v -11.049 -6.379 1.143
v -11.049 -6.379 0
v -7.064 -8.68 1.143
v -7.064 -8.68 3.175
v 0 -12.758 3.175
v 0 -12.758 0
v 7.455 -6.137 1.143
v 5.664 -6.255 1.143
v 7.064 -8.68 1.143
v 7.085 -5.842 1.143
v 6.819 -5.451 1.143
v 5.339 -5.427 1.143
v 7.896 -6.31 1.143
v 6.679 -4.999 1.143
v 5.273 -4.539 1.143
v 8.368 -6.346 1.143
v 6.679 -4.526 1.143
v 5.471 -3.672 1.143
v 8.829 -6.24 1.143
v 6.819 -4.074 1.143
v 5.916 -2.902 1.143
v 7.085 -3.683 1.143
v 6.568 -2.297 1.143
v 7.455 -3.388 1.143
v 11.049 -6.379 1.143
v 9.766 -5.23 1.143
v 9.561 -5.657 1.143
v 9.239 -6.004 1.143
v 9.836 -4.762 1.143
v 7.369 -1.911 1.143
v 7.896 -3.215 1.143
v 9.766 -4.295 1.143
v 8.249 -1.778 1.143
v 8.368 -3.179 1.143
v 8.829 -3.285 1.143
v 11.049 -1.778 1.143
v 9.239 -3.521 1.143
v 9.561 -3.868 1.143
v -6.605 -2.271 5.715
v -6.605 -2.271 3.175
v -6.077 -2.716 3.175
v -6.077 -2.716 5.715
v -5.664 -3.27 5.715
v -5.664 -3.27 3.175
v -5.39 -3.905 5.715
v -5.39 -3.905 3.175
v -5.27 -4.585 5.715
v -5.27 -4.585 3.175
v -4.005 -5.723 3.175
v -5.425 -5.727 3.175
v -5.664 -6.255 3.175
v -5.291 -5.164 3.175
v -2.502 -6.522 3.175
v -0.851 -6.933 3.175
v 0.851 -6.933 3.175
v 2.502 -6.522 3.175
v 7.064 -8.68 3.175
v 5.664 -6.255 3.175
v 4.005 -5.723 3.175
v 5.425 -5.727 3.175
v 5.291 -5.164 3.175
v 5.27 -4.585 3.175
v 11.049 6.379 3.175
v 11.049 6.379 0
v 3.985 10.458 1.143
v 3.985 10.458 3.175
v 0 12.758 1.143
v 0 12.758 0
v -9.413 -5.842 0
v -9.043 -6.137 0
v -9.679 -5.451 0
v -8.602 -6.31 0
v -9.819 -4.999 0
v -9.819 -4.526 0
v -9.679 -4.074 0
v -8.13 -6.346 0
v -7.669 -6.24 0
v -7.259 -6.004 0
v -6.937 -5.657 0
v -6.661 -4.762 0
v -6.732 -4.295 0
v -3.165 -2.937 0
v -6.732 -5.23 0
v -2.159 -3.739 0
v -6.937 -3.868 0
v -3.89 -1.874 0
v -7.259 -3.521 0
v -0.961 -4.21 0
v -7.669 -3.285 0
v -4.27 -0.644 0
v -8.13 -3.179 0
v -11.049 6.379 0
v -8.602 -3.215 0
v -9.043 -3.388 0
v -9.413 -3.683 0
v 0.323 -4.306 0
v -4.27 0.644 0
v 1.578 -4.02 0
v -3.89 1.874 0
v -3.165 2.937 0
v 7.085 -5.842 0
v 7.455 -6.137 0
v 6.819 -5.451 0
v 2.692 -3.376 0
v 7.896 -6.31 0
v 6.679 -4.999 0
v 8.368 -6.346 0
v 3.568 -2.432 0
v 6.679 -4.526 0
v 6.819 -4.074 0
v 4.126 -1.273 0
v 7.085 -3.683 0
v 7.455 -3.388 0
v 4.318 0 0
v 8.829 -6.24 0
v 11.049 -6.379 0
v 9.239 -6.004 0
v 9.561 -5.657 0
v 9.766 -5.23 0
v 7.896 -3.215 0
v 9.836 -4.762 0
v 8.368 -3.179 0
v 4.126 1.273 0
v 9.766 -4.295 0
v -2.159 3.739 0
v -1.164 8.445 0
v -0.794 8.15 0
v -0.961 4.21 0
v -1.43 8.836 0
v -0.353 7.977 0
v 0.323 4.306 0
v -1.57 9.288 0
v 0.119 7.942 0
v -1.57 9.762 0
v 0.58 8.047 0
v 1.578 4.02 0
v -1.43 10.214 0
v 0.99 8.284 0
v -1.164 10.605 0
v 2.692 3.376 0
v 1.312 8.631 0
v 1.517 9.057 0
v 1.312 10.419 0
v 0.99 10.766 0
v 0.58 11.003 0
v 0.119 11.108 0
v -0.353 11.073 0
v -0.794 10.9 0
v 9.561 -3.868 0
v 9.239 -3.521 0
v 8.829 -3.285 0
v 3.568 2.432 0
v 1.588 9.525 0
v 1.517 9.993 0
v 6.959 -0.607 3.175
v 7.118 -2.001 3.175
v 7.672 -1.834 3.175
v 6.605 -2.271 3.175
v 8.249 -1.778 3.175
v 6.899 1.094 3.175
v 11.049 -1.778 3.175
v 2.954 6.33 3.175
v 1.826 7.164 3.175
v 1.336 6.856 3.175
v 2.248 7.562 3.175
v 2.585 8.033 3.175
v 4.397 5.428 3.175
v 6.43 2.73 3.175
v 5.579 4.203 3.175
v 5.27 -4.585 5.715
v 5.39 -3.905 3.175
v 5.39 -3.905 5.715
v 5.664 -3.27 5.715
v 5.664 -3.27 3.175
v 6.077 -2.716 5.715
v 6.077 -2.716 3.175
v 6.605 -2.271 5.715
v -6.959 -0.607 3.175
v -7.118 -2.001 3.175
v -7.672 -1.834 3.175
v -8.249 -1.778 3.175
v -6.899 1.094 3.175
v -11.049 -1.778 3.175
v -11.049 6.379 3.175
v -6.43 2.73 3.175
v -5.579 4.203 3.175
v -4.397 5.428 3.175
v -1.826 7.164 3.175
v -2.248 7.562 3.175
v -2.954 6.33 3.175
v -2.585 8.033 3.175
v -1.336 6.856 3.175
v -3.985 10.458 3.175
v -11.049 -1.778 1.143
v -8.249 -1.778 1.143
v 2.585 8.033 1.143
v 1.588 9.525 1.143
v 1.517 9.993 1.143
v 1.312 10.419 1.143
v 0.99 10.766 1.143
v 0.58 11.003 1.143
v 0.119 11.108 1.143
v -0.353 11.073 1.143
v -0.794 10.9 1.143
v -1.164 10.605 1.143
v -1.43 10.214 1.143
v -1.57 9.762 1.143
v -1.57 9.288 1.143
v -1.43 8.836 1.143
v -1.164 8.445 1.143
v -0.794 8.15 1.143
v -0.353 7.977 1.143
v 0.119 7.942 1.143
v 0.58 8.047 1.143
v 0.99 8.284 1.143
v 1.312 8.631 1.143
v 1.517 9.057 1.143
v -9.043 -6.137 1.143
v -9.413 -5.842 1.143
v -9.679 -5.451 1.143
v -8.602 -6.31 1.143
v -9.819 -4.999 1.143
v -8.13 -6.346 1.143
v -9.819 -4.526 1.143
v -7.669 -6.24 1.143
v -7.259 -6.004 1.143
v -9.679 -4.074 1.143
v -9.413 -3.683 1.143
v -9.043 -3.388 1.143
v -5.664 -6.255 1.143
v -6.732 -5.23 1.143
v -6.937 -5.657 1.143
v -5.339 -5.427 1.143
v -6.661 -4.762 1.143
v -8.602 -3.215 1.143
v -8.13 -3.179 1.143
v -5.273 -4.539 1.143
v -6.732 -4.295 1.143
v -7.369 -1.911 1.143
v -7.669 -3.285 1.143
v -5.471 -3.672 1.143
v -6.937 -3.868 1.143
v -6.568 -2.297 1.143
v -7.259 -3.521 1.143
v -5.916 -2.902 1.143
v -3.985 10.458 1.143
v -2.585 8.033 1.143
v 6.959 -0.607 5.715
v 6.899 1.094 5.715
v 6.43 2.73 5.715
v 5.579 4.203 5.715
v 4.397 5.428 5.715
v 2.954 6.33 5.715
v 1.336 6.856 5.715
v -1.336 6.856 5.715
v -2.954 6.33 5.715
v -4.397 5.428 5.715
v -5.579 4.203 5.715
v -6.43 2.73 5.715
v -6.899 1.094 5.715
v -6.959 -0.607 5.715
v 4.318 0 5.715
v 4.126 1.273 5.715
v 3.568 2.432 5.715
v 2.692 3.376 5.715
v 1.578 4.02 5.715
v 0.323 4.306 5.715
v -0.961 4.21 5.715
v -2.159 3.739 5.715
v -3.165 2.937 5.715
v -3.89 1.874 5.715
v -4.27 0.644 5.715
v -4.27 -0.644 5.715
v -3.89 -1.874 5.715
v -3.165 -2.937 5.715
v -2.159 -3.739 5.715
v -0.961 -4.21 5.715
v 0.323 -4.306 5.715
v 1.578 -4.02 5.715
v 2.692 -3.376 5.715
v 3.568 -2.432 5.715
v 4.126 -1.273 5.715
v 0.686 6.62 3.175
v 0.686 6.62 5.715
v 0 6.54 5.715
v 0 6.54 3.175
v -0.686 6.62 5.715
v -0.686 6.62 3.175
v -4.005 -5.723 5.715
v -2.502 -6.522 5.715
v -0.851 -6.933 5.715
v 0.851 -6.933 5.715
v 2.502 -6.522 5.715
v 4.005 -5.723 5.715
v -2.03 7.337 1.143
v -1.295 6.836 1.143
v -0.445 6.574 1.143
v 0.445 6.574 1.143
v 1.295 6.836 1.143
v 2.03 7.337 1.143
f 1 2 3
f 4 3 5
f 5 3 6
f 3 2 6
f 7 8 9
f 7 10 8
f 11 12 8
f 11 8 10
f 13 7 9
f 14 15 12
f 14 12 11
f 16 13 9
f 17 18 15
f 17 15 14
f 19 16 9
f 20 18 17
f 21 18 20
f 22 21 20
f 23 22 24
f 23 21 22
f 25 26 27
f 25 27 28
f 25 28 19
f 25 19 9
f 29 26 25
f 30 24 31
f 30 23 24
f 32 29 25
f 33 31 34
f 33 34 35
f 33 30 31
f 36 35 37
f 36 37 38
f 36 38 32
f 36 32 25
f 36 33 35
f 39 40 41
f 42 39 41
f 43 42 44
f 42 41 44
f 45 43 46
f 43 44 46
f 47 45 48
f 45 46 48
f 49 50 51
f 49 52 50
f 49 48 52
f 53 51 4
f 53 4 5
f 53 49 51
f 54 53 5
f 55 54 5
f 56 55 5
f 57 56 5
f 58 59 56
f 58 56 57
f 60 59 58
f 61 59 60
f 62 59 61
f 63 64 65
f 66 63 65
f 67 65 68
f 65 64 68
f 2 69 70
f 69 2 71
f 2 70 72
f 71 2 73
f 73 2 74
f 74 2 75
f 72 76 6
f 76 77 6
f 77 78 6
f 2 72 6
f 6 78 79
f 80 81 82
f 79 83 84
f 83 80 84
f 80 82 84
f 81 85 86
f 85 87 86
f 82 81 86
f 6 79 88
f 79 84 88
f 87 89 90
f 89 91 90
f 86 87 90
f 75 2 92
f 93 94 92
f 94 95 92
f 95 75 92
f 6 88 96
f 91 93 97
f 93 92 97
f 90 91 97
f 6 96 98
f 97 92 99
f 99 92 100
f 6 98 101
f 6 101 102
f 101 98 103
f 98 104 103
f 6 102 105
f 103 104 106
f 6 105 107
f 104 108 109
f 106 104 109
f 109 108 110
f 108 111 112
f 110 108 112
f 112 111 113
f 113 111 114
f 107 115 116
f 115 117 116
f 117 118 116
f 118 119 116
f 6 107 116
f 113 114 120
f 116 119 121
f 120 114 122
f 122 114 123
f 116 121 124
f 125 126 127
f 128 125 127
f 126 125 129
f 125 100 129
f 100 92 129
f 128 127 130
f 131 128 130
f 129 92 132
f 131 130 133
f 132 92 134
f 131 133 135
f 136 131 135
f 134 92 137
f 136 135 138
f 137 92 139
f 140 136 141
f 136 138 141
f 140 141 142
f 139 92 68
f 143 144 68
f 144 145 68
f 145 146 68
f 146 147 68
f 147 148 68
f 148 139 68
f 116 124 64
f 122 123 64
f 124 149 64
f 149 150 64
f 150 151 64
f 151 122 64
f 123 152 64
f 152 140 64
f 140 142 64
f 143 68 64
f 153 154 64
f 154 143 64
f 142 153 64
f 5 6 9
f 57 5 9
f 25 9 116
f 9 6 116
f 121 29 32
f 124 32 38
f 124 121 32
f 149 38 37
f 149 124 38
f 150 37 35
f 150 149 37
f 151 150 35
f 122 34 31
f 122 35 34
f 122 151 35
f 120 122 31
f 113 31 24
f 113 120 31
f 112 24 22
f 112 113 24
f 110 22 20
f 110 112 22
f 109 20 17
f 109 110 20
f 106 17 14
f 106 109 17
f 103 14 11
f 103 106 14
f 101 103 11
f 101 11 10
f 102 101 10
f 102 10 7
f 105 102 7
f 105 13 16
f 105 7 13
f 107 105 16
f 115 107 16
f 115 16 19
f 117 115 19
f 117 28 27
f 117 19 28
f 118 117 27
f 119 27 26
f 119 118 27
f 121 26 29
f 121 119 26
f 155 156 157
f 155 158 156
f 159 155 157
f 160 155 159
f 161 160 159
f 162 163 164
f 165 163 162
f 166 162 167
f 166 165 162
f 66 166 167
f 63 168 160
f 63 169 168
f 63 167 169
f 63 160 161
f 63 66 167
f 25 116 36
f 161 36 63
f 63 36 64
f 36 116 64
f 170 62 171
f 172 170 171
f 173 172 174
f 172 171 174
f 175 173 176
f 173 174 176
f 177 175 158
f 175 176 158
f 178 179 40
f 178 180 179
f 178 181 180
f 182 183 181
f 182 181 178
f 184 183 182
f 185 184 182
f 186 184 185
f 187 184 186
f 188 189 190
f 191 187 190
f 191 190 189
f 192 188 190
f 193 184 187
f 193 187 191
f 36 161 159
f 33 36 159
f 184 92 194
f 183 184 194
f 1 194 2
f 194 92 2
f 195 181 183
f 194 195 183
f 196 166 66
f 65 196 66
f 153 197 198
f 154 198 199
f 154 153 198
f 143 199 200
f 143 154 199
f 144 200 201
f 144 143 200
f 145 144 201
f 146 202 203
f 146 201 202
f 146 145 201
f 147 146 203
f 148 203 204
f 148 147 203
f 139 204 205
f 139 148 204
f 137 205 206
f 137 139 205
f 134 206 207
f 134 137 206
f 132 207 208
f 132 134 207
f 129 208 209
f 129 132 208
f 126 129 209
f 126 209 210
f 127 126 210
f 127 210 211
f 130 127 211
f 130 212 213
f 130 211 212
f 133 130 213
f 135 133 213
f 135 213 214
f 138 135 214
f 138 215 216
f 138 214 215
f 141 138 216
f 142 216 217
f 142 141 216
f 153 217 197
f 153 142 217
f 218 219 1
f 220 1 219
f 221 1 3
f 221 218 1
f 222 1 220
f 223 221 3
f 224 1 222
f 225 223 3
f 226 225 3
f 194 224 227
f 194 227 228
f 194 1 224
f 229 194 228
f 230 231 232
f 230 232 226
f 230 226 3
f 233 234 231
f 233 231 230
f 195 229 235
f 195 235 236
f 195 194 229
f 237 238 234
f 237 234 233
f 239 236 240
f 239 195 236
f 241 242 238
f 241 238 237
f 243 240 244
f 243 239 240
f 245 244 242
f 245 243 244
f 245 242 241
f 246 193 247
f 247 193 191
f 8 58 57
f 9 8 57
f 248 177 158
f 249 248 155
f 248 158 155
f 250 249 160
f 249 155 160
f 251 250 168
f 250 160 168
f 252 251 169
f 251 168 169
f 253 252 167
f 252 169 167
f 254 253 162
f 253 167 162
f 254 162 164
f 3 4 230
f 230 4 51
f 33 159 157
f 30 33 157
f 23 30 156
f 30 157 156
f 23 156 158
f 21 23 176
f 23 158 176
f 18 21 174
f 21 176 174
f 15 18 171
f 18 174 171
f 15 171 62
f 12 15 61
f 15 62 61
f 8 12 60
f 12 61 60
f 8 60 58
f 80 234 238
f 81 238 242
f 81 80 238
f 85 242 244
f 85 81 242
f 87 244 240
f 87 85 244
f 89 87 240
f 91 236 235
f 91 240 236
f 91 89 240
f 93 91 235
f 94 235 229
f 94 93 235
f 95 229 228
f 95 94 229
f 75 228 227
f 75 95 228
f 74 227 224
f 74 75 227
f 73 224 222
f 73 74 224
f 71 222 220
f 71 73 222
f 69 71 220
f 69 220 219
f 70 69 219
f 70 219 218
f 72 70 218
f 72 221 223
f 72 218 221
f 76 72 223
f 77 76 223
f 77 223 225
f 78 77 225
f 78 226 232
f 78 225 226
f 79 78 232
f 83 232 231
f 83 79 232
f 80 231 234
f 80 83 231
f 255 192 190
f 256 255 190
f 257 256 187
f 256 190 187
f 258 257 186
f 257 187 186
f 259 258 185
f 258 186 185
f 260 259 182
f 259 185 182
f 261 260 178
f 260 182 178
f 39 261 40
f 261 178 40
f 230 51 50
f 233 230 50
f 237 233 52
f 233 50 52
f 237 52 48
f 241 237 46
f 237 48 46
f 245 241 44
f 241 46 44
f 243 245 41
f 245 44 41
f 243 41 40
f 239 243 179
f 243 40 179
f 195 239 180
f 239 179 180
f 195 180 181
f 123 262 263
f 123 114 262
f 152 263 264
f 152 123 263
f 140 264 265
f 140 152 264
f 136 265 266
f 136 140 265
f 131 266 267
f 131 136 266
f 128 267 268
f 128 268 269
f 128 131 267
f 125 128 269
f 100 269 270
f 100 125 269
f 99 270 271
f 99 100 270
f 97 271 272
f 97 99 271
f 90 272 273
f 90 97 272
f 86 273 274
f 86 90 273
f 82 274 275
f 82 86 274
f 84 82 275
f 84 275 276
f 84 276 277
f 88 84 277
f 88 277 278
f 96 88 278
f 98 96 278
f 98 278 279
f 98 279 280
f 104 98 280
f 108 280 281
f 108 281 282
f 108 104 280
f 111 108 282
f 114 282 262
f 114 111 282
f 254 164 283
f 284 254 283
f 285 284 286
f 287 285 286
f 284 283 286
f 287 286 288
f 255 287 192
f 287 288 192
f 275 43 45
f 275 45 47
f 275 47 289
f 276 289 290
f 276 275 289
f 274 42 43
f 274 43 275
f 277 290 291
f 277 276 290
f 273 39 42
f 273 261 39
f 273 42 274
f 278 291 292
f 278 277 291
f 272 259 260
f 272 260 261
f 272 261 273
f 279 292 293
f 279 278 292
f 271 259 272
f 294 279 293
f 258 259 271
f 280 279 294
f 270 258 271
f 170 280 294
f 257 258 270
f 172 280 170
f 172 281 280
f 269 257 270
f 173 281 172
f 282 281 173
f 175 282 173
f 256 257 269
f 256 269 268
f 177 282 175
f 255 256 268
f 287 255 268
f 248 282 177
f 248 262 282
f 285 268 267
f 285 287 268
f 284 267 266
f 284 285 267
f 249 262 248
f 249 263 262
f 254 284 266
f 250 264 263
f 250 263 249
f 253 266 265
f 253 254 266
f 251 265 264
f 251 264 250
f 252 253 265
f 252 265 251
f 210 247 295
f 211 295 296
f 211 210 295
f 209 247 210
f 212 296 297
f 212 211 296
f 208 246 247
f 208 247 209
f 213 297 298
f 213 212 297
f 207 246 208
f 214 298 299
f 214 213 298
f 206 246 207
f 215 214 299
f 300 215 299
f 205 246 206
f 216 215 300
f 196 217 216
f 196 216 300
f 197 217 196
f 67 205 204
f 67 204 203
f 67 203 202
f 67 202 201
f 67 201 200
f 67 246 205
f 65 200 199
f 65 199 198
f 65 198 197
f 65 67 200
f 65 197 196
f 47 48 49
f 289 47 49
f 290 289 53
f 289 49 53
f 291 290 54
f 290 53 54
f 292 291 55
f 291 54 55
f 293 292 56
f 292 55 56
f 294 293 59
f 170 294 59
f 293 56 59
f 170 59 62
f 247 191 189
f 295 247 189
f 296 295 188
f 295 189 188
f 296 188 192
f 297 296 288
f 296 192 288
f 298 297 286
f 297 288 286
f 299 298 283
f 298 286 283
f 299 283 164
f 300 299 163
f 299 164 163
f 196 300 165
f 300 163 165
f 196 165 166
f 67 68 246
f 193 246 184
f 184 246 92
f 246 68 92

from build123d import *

# Parameters (mm, degrees)
F0_R     = 1.5875
F0_R_2   = 4.318
F1_DEPTH = 3.175
F3_DEPTH = 2.032
F5_R     = 4.318
F6_DEPTH = 2.54


with BuildPart() as f1:
    # F0 (on Top) → F1 (new body)
    with BuildSketch(Plane.XY):
        Polygon((11.049, -6.379143), (11.049, 6.379143), (0, 12.758286), (-11.049, 6.379143), (-11.049, -6.379143), (0, -12.758286), align=None)
        with Locations((-8.248892, -4.7625)):
            Circle(F0_R, mode=Mode.SUBTRACT)
        with Locations((8.248892, -4.7625)):
            Circle(F0_R, mode=Mode.SUBTRACT)
        Circle(F0_R_2, mode=Mode.SUBTRACT)
        with Locations((0, 9.525)):
            Circle(F0_R, mode=Mode.SUBTRACT)
    extrude(amount=F1_DEPTH)

    # F2 (on face) → F3 (cut)
    with BuildSketch(Plane.XY.offset(3.175)):
        with BuildLine():
            Line((0, 12.758286), (-3.984707, 10.457715))
            Line((-3.984707, 10.457715), (-2.584653, 8.03275))
            ThreePointArc((-2.584653, 8.03275), (0, 6.5405), (2.584653, 8.03275))
            Line((2.584653, 8.03275), (3.984707, 10.457715))
            Line((3.984707, 10.457715), (0, 12.758286))
        make_face()
        with BuildLine():
            Line((-8.248892, -1.778), (-11.049, -1.778))
            Line((-11.049, -1.778), (-11.049, -6.379143))
            Line((-11.049, -6.379143), (-7.064293, -8.679715))
            Line((-7.064293, -8.679715), (-5.664239, -6.25475))
            ThreePointArc((-5.664239, -6.25475), (-5.664239, -3.27025), (-8.248892, -1.778))
        make_face()
        with BuildLine():
            Line((5.664239, -6.25475), (7.064293, -8.679715))
            Line((7.064293, -8.679715), (11.049, -6.379143))
            Line((11.049, -6.379143), (11.049, -1.778))
            Line((11.049, -1.778), (8.248892, -1.778))
            ThreePointArc((8.248892, -1.778), (5.664239, -3.27025), (5.664239, -6.25475))
        make_face()
    extrude(amount=-F3_DEPTH, mode=Mode.SUBTRACT)

    # F5 (on face) → F6 (join)
    with BuildSketch(Plane.XY.offset(3.175)):
        with BuildLine():
            ThreePointArc((-6.60542, -2.271268), (-5.664239, -3.27025), (-5.269685, -4.584827))
            ThreePointArc((-5.269685, -4.584827), (0, -6.985), (5.269685, -4.584827))
            ThreePointArc((5.269685, -4.584827), (5.664239, -3.27025), (6.60542, -2.271268))
            ThreePointArc((6.60542, -2.271268), (6.049187, 3.4925), (1.335734, 6.856095))
            ThreePointArc((1.335734, 6.856095), (0, 6.5405), (-1.335734, 6.856095))
            ThreePointArc((-1.335734, 6.856095), (-6.049187, 3.4925), (-6.60542, -2.271268))
        make_face()
        Circle(F5_R, mode=Mode.SUBTRACT)
    extrude(amount=F6_DEPTH)


solid = f1.part
